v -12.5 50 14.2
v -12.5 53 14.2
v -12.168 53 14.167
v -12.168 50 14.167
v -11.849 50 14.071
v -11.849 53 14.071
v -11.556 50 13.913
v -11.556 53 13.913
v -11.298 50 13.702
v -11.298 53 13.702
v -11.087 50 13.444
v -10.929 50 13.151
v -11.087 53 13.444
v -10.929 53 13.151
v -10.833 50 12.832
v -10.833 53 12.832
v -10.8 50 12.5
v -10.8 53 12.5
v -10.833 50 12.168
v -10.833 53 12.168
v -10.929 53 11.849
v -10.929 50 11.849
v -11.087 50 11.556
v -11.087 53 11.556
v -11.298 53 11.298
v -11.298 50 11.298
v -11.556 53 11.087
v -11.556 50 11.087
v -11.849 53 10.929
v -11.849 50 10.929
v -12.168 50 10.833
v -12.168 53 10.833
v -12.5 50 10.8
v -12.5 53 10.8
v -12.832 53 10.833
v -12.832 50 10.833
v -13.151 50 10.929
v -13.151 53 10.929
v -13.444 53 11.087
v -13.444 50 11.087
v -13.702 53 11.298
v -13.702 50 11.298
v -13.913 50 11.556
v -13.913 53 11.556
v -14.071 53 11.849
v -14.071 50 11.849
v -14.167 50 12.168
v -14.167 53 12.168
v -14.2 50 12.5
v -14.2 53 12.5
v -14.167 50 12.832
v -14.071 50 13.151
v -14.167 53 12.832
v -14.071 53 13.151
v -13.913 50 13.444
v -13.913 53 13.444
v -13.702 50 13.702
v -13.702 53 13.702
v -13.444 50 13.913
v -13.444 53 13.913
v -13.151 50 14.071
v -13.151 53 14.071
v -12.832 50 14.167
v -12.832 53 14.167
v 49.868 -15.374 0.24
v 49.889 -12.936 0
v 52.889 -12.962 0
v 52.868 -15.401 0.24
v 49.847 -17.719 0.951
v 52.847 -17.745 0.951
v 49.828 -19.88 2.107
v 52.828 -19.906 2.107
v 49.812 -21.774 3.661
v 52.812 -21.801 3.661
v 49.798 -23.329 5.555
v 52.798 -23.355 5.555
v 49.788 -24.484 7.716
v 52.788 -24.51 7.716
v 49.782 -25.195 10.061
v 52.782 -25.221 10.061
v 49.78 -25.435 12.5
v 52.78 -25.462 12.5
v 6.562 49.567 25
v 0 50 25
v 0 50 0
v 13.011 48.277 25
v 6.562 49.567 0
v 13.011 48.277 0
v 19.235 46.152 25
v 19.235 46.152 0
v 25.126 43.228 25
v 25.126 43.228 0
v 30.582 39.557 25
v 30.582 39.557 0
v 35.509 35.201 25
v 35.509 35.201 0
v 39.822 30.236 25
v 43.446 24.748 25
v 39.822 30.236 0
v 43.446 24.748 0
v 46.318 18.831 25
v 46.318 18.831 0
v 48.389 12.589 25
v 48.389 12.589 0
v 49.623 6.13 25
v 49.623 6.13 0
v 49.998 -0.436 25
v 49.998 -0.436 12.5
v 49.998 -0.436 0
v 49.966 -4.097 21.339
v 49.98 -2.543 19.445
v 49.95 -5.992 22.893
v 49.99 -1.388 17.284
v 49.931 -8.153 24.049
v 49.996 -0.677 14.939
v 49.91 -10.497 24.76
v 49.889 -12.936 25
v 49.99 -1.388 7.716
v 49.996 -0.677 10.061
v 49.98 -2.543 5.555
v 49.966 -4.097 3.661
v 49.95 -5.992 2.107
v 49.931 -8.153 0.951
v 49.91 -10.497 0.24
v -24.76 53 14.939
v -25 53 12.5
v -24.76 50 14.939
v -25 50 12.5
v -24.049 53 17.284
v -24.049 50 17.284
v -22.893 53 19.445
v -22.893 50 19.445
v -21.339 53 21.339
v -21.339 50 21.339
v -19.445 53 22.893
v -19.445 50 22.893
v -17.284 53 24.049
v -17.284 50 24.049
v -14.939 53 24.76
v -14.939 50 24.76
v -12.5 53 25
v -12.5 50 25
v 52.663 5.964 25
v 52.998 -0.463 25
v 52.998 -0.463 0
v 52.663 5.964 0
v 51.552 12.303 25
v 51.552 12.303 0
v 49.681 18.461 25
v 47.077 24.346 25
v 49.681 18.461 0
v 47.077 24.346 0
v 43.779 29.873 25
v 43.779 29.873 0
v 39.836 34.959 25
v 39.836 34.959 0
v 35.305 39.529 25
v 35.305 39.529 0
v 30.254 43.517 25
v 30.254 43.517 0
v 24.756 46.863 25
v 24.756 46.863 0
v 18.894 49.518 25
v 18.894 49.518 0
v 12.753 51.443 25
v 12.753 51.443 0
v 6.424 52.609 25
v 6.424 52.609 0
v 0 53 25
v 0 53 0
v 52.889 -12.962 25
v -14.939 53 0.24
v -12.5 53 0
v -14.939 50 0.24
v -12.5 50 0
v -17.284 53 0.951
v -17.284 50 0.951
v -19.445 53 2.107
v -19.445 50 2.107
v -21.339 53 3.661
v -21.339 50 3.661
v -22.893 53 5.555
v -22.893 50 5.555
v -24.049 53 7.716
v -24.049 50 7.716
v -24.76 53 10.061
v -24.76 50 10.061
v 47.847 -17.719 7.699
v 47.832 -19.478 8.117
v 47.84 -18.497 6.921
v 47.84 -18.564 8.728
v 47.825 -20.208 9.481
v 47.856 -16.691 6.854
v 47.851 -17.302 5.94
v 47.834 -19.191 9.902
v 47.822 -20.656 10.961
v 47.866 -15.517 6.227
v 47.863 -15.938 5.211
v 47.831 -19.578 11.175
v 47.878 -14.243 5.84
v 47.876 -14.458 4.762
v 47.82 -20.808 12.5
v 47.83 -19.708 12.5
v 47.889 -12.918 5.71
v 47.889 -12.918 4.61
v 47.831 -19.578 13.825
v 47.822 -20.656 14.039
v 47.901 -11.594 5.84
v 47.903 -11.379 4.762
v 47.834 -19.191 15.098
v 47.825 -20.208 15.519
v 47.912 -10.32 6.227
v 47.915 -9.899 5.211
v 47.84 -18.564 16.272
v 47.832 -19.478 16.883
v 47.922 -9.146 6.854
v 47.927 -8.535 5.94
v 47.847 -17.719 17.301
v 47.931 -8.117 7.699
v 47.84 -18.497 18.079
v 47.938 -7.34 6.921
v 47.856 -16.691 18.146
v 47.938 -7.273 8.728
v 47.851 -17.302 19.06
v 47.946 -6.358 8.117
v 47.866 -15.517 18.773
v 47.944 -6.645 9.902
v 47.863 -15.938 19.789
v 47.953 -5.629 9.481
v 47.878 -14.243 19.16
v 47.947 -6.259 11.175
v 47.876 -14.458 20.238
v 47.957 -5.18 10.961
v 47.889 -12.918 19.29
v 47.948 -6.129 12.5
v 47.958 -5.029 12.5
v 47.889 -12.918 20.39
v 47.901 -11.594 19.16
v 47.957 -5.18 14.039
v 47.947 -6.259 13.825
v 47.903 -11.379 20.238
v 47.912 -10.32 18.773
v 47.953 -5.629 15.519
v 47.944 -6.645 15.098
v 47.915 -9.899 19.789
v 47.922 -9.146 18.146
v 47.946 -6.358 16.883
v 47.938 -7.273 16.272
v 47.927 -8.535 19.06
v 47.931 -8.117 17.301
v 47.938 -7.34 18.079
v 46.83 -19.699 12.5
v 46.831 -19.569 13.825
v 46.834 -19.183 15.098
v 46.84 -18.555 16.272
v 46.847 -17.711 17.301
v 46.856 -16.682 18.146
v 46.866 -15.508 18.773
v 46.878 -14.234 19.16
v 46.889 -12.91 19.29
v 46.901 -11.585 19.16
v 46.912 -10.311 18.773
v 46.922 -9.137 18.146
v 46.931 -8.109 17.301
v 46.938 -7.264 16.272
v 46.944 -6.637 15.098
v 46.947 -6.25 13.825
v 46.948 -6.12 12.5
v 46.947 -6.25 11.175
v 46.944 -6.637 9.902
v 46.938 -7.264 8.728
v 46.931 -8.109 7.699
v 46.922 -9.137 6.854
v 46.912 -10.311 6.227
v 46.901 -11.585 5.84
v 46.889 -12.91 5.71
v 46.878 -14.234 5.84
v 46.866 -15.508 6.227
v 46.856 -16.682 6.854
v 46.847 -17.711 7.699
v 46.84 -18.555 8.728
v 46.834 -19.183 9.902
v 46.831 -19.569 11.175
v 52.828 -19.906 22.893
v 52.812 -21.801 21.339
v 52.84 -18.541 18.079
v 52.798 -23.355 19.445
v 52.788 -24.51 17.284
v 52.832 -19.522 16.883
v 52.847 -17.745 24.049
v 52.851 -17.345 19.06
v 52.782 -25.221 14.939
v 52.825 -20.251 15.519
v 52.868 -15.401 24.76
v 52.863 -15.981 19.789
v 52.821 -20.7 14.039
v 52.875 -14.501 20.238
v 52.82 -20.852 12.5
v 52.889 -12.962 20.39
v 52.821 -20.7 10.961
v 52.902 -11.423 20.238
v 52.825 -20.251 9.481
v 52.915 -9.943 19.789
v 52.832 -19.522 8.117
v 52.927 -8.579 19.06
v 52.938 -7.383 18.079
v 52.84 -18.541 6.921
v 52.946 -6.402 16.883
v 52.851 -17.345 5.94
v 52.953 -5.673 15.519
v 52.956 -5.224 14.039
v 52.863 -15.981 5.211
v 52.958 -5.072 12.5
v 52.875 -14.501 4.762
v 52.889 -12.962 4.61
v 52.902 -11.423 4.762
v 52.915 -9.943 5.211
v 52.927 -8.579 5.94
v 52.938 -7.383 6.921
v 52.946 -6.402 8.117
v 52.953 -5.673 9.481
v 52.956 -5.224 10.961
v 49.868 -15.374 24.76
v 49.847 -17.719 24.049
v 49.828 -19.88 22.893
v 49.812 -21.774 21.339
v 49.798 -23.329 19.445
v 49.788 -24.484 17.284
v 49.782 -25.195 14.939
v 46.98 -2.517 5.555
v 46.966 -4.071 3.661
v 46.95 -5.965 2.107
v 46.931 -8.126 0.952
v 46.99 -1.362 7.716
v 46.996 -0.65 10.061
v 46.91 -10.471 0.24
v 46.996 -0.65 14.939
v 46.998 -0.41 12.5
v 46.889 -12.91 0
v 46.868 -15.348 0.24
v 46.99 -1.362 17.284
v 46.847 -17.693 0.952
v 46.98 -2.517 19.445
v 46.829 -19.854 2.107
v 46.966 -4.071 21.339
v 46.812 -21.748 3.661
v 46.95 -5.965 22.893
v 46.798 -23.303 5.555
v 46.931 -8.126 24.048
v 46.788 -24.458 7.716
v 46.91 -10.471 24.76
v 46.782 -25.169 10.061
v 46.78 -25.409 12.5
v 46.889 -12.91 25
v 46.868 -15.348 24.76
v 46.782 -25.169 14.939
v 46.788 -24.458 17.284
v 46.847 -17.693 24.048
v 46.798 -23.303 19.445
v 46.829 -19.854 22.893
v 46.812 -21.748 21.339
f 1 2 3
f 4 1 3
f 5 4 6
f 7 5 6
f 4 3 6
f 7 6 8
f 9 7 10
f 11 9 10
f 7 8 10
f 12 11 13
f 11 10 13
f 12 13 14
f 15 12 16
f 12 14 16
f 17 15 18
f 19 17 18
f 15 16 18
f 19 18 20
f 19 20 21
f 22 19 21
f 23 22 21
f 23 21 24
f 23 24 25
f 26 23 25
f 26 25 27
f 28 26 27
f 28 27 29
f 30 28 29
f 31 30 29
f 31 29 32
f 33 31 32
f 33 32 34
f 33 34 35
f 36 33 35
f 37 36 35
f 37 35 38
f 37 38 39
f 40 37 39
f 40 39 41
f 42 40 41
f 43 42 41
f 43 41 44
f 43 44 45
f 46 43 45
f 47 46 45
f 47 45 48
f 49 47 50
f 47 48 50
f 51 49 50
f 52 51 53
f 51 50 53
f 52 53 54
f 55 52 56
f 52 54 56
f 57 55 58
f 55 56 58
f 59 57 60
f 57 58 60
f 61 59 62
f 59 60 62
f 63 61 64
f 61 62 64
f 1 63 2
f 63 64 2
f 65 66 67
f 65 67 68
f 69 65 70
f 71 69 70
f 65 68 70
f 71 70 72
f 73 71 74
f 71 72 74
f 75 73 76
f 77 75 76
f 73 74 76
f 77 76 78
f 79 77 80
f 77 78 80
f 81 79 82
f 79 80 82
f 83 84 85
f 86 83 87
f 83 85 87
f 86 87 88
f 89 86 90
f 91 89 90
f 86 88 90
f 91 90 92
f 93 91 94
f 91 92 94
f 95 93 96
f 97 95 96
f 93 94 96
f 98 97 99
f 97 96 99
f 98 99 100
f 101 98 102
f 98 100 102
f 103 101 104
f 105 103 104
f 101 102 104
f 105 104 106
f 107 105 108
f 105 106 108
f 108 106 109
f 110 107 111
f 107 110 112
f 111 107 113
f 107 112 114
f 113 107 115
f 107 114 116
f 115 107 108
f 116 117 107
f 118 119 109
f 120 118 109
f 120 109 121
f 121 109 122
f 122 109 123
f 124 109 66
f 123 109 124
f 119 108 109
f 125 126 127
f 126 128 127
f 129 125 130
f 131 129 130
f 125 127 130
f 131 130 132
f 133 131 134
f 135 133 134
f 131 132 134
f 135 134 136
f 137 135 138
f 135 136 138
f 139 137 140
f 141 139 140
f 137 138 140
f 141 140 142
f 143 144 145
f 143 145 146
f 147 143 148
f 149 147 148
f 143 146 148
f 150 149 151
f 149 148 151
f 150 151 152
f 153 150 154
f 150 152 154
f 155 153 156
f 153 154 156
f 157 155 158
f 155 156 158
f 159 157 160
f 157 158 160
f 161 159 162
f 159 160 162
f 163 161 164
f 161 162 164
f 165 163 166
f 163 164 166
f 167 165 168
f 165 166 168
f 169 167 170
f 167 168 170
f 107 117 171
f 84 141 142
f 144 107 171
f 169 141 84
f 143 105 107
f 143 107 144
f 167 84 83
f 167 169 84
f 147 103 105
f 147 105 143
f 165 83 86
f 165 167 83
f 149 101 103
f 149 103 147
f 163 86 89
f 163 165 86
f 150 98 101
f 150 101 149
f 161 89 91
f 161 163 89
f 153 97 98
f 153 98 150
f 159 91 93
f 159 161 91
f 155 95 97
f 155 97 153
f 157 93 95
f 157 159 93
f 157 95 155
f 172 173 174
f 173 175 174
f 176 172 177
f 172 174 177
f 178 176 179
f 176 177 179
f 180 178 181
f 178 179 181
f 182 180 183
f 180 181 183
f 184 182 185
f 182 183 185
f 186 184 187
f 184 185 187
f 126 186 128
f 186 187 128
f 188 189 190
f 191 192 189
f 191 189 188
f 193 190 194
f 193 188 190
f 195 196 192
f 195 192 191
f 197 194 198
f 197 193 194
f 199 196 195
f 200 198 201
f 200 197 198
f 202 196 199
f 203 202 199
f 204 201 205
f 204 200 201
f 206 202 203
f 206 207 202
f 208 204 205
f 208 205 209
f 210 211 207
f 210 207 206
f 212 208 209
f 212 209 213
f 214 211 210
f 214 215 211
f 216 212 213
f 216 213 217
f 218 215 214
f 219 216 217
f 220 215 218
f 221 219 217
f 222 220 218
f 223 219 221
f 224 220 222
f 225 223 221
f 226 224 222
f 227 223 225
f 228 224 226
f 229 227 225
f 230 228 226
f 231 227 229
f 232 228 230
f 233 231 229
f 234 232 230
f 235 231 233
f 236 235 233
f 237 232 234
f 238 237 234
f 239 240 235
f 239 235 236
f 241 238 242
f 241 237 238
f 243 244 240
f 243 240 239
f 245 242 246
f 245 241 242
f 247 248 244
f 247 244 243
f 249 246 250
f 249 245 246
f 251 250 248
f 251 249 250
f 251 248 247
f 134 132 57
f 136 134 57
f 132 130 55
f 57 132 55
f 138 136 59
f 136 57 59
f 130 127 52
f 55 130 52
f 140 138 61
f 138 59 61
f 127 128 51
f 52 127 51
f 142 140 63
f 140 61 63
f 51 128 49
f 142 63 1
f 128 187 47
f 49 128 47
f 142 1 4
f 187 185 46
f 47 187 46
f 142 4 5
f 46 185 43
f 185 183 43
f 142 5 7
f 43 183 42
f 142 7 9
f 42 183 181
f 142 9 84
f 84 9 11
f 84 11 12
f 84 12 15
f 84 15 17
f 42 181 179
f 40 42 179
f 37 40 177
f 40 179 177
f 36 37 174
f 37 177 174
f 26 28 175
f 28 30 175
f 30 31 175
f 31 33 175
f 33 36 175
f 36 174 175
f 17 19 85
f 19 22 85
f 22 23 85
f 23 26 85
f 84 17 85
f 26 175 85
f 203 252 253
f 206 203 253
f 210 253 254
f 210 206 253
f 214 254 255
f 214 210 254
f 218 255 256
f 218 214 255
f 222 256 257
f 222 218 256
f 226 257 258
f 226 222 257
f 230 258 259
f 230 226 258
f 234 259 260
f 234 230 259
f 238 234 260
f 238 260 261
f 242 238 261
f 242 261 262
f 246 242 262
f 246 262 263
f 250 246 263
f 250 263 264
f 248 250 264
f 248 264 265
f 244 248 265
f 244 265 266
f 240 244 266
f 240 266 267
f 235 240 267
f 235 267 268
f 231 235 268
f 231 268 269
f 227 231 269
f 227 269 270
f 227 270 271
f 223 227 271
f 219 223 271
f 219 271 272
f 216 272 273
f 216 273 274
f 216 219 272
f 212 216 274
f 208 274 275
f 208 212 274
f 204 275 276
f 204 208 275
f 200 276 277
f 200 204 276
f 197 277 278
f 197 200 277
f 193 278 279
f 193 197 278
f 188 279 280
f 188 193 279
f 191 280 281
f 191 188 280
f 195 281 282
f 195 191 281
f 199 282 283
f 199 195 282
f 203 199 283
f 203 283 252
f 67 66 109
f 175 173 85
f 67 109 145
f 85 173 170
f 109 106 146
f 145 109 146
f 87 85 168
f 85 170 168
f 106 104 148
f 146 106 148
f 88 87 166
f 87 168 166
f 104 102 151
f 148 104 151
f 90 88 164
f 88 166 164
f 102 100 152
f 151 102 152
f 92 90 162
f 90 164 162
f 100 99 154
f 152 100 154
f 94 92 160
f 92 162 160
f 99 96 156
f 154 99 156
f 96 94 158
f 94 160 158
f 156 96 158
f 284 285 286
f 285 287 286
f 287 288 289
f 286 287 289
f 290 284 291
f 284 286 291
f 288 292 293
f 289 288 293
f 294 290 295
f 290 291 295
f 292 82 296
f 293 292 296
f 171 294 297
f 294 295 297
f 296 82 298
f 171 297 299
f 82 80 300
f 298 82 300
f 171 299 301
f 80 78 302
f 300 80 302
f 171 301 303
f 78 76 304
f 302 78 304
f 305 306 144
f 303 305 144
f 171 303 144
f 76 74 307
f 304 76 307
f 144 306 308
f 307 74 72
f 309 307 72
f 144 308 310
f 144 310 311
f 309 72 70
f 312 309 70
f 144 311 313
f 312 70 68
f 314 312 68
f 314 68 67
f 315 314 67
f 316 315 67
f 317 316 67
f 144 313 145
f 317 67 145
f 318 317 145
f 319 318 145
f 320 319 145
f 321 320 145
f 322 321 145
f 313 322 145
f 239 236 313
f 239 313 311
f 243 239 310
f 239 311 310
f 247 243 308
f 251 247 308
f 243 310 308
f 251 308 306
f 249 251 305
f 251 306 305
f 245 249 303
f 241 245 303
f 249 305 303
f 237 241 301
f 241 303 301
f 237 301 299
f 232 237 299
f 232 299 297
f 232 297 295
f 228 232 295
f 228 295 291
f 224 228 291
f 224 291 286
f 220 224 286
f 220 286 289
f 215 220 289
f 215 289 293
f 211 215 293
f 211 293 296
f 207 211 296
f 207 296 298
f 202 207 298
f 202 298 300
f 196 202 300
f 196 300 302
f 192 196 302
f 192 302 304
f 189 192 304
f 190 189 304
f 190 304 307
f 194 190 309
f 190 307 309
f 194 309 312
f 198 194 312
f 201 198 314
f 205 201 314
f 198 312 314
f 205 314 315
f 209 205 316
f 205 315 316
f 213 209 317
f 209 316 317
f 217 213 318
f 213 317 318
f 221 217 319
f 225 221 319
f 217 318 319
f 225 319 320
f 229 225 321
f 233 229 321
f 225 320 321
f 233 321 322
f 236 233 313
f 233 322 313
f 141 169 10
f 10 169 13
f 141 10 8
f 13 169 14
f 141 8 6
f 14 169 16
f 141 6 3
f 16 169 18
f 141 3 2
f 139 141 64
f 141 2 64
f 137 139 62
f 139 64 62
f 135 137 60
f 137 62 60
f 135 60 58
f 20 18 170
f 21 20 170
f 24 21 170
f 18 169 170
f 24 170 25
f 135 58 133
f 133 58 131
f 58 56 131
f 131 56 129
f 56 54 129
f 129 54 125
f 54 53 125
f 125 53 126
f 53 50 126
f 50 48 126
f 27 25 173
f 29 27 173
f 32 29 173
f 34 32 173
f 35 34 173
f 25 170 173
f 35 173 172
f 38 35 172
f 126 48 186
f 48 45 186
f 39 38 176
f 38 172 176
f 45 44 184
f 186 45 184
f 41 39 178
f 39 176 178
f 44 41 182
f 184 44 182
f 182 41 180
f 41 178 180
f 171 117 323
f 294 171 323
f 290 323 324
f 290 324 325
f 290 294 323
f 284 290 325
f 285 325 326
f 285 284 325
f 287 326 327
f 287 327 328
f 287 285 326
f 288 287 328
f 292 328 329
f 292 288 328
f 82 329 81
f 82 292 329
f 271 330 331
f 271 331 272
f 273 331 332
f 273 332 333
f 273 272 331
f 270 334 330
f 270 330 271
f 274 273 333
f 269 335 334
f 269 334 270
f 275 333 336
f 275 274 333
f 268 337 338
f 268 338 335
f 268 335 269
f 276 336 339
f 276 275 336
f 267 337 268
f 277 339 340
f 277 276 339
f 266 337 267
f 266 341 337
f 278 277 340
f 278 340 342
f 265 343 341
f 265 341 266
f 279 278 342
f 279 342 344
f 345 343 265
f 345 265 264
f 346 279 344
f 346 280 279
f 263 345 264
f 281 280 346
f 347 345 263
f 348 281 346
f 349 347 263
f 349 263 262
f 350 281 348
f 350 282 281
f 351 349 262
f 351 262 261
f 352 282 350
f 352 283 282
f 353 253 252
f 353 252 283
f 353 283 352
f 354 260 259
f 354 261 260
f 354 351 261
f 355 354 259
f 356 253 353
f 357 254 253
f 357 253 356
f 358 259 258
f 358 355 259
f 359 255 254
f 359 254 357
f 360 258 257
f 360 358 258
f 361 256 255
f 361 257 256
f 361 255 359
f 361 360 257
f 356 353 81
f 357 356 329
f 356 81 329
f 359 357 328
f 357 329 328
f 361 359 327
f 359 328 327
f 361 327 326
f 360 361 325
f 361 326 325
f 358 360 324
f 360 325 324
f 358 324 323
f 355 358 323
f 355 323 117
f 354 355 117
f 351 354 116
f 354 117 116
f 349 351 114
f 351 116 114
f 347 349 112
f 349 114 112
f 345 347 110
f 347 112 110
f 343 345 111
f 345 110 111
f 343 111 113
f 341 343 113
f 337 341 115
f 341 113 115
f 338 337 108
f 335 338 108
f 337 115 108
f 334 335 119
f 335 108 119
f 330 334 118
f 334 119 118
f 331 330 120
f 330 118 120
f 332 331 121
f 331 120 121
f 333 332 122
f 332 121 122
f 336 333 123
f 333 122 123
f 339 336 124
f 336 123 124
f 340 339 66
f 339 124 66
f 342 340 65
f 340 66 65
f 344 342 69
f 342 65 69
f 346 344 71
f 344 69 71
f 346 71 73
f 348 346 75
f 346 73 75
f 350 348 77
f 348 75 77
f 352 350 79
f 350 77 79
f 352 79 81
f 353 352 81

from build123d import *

# Parameters (mm, degrees)
BOSS_EXTRUDE1_DEPTH = 25
CUT_EXTRUDE1_REACH  = 99.811
SKETCH6_R           = 7.89
FILLET1_R           = 12.5
FILLET2_R           = 12.5
SKETCH7_R           = 12.5
SKETCH7_R_2         = 6.79
BOSS_EXTRUDE2_DEPTH = 3
SKETCH8_R           = 7.89
CUT_EXTRUDE2_DEPTH  = 5
CUT_EXTRUDE3_REACH  = 99.93
SKETCH9_R           = 1.7


with BuildPart() as part:
    # Sketch2 → Boss-Extrude1 (new body)
    with BuildSketch(Plane.XY):
        with BuildLine():
            Line((0, 53), (-25, 53))
            Line((-25, 53), (-25, 50))
            Line((-25, 50), (0, 50))
            ThreePointArc((0, 50), (35.509268781, 35.200736223), (49.998096153, -0.436326775))
            Line((49.998096153, -0.436326775), (49.779932766, -25.435374852))
            Line((49.779932766, -25.435374852), (52.779818535, -25.461554458))
            Line((52.779818535, -25.461554458), (52.997981922, -0.462506381))
            ThreePointArc((52.997981922, -0.462506381), (37.639824908, 37.312780396), (0, 53))
        make_face()
    extrude(amount=BOSS_EXTRUDE1_DEPTH)

    # Sketch6 → Cut-Extrude1 (cut, up to next)
    with BuildSketch(Plane(origin=(52.997981922, -0.462506381, 0), x_dir=(0, 0, -1), z_dir=(0.9999619230641714, -0.00872653549837746, 0)), mode=Mode.PRIVATE) as cut_extrude1_sk1:
        with Locations(Location((-12.5, -12.5, 0), (0, 0, 90))):
            Circle(SKETCH6_R)
    cut_extrude1_tool1 = extrude(cut_extrude1_sk1.sketch, amount=-CUT_EXTRUDE1_REACH, mode=Mode.PRIVATE) & part.part
    add(cut_extrude1_tool1.solids().sort_by_distance((52.8889, -12.96203, 12.5))[0], mode=Mode.SUBTRACT)

    # Fillet1
    fillet1_edges = [part.edges().sort_by_distance(p)[0] for p in [
        (51.27987565, -25.448464655, 0),
        (51.27987565, -25.448464655, 25),
    ]]
    fillet(fillet1_edges, radius=FILLET1_R - 0.0001)  # a hair under: the kernel refuses the full size

    # Fillet2
    fillet2_edges = [part.edges().sort_by_distance(p)[0] for p in [
        (-25, 51.5, 25),
        (-25, 51.5, 0),
    ]]
    fillet(fillet2_edges, radius=FILLET2_R - 0.0001)  # a hair under: the kernel refuses the full size

    # Sketch7 → Boss-Extrude2 (add)
    with BuildSketch(Plane(origin=(49.998096153, -0.436326775, 0), x_dir=(0, 0, 1), z_dir=(-0.9999619230641714, 0.008726535498377049, 0))):
        with Locations(Location((12.5, -12.5, 0), (0, 0, 270))):
            Circle(SKETCH7_R)
        with Locations(Location((12.5, -12.5, 0), (0, 0, 270))):
            Circle(SKETCH7_R_2, mode=Mode.SUBTRACT)
    extrude(amount=BOSS_EXTRUDE2_DEPTH)

    # Sketch8 → Cut-Extrude2 (cut)
    with BuildSketch(Plane(origin=(52.997981922, -0.462506381, 0), x_dir=(0, 0, -1), z_dir=(0.9999619230641714, -0.00872653549837732, 0))):
        with Locations(Location((-12.5, -12.5, 0), (0, 0, 90))):
            Circle(SKETCH8_R)
    extrude(amount=-CUT_EXTRUDE2_DEPTH, mode=Mode.SUBTRACT)

    # Sketch9 → Cut-Extrude3 (cut, up to next)
    with BuildSketch(Plane(origin=(0, 53, 0), x_dir=(1, 0, 0), z_dir=(0, 1, 0)), mode=Mode.PRIVATE) as cut_extrude3_sk1:
        with Locations(Location((-12.5, -12.5, 0), (0, 0, 270))):
            Circle(SKETCH9_R)
    cut_extrude3_tool1 = extrude(cut_extrude3_sk1.sketch, amount=-CUT_EXTRUDE3_REACH, mode=Mode.PRIVATE) & part.part
    add(cut_extrude3_tool1.solids().sort_by_distance((-12.5, 53, 12.5))[0], mode=Mode.SUBTRACT)


solid = part.part
